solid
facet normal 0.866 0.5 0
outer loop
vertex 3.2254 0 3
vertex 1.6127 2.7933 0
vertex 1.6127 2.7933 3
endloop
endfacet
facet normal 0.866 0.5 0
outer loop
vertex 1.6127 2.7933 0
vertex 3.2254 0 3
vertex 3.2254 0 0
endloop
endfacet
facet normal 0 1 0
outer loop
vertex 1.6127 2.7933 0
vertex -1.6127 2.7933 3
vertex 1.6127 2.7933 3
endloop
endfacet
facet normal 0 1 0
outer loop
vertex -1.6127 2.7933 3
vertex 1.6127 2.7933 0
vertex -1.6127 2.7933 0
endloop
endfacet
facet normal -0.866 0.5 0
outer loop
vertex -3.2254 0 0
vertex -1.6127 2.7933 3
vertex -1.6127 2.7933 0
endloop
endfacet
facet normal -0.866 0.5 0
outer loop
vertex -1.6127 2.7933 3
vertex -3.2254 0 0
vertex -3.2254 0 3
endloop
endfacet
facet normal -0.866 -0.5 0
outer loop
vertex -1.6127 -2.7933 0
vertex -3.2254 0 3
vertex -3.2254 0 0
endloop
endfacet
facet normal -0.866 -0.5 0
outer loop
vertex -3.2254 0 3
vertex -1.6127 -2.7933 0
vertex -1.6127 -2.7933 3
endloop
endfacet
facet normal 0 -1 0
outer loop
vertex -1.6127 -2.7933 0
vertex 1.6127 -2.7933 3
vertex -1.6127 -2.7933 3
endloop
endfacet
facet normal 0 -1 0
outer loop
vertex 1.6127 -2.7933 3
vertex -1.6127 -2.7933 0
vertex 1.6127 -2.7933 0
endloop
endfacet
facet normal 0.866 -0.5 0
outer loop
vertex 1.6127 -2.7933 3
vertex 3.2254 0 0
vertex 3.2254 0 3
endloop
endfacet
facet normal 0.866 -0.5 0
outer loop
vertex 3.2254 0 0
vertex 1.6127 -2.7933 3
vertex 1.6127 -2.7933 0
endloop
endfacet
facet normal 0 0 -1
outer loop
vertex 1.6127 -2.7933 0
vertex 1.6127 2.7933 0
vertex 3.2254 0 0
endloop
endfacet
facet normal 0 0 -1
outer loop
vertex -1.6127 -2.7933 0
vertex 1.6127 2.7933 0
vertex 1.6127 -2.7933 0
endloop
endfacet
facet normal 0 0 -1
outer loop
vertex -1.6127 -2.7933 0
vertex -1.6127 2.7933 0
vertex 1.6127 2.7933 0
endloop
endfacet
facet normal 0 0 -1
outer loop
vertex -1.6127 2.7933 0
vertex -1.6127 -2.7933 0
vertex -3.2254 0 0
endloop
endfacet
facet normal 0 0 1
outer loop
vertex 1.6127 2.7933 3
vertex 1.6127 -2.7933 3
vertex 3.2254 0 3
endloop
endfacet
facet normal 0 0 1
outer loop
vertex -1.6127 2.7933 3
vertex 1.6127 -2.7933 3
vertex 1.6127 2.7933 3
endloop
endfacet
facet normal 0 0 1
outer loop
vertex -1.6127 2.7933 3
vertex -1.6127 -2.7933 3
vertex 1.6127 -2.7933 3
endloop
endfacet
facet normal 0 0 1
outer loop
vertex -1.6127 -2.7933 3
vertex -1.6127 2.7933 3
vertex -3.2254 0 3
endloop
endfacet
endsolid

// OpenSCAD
//nut trap
//default values are for M3 nut
//if you use this module as a nut trap cutout, you need to add +de (ie 0.1mm or similiar) to height
//in order to get non-manifold cutouts
module nut_trap (
        w = 5.5,
        h = 3
        )
{
        cylinder(r = w / 2 / cos(180 / 6) + 0.05, h=h, $fn=6);
}    

nut_trap();
